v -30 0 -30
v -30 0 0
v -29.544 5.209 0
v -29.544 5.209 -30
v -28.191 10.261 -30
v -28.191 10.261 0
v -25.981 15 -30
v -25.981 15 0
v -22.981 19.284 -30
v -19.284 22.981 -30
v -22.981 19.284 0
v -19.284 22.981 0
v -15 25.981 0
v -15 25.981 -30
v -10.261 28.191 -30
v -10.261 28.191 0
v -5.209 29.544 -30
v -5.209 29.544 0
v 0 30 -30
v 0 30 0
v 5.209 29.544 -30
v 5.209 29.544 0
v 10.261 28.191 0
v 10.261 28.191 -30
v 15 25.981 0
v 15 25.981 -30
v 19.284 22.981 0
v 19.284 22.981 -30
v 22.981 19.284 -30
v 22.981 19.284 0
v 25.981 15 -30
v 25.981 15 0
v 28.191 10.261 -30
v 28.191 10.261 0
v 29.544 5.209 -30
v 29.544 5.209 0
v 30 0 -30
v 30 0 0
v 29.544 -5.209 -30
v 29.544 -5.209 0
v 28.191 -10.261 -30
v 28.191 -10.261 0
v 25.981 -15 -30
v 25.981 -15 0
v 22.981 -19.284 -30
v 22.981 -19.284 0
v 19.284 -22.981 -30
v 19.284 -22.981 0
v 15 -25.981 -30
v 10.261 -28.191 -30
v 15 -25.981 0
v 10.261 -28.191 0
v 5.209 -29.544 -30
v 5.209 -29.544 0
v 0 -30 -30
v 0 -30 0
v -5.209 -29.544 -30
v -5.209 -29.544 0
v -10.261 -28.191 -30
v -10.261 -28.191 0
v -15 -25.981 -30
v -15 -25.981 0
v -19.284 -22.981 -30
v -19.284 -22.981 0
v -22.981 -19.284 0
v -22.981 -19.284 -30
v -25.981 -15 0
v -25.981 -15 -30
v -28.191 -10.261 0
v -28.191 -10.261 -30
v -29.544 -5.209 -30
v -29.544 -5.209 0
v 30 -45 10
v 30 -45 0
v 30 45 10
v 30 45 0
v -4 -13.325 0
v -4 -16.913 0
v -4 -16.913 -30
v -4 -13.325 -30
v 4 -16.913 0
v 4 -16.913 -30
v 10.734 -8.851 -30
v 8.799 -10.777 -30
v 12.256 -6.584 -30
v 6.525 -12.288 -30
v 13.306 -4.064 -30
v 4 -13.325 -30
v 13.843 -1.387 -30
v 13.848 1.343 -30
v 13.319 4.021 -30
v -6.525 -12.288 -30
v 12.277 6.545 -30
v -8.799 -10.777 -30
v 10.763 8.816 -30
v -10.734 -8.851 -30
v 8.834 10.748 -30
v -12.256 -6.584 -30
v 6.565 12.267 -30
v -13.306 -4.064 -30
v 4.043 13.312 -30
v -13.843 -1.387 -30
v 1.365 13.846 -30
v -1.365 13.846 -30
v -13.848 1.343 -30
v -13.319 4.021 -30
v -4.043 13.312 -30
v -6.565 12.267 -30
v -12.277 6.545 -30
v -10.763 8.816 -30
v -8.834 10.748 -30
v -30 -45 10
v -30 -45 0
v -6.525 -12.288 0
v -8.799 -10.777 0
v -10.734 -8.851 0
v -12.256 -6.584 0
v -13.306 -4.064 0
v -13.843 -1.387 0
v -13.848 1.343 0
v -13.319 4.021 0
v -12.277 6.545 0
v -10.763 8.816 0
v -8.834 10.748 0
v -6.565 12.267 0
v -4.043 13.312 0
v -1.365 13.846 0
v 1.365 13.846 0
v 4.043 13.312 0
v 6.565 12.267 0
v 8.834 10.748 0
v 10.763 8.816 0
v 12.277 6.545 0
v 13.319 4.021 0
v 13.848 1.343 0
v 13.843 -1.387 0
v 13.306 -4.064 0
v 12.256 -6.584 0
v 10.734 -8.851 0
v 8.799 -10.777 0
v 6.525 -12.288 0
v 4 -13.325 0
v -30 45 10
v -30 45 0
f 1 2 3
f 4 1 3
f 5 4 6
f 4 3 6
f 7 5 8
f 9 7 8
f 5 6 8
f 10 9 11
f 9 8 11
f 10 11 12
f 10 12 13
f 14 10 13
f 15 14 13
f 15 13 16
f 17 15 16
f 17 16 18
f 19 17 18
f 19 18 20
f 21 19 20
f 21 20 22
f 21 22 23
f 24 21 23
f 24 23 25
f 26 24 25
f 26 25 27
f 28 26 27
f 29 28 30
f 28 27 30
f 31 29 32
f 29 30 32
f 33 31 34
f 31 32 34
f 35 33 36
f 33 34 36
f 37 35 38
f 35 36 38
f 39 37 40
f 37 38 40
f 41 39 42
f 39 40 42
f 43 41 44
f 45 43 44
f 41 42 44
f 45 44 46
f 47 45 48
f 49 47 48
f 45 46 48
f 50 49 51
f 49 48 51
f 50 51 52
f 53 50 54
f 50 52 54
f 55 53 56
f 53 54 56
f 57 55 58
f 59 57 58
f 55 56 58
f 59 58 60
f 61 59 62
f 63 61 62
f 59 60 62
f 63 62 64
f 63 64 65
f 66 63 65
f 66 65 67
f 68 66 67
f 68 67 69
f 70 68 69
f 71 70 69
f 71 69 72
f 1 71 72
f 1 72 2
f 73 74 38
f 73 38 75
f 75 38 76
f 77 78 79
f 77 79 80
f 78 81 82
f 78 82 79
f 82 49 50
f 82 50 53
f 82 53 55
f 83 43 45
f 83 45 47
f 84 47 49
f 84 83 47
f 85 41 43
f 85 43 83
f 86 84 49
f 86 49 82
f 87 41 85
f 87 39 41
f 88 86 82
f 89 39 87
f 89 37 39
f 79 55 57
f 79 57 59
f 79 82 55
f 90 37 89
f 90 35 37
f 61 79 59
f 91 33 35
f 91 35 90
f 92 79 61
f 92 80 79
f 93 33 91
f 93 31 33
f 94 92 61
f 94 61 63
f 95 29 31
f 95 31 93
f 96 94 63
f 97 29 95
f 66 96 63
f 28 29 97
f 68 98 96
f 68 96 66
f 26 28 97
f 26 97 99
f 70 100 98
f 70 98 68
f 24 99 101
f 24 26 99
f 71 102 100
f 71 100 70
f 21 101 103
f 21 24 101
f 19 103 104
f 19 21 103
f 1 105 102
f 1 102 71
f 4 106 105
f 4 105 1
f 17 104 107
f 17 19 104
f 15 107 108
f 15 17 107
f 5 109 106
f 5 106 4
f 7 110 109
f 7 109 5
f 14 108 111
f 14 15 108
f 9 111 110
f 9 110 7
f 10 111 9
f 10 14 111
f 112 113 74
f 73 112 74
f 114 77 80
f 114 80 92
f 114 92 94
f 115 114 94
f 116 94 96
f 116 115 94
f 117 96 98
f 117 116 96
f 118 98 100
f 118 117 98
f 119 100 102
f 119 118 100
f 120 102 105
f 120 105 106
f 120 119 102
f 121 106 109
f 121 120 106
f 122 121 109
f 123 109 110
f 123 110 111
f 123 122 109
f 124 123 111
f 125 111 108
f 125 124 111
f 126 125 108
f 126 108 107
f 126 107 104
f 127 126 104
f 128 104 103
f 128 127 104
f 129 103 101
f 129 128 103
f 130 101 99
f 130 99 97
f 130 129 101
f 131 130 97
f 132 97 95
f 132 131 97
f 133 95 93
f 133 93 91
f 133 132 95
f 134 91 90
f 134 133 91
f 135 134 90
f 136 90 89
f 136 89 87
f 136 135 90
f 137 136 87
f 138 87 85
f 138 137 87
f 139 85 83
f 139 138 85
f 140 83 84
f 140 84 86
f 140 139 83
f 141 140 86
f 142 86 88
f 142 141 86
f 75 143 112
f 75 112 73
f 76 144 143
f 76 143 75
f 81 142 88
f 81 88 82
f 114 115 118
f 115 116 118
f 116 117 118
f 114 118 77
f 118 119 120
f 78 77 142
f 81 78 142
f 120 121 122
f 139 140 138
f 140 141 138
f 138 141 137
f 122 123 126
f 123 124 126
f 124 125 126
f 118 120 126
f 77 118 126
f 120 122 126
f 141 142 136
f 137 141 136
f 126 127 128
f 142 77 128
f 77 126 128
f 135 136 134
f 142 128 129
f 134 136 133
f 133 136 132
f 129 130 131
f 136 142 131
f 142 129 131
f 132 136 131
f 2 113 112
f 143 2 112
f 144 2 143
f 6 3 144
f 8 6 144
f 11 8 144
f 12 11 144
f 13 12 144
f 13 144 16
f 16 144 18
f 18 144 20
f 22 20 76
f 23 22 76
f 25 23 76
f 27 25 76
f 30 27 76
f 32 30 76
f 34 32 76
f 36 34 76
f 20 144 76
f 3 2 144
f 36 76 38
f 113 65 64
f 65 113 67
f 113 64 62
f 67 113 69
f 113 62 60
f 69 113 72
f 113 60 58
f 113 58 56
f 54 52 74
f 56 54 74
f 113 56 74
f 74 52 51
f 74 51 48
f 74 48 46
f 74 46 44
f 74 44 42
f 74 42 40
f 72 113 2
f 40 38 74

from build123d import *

# Parameters (mm, degrees)
SKETCH1_W           = 60
SKETCH1_H           = 90
BOSS_EXTRUDE1_DEPTH = 10
SKETCH2_R           = 30
BOSS_EXTRUDE2_DEPTH = 30


with BuildPart() as part:
    # Sketch1 → Boss-Extrude1 (new body)
    with BuildSketch(Plane.XY):
        Rectangle(SKETCH1_W, SKETCH1_H)
    extrude(amount=BOSS_EXTRUDE1_DEPTH)

    # Sketch2 → Boss-Extrude2 (add)
    with BuildSketch(Plane(origin=(0, 0, 0), x_dir=(-1, 0, 0), z_dir=(0, 0, -1))):
        Circle(SKETCH2_R)
        with BuildLine():
            Line((4, -13.912685387), (4, -13.325269778))
            ThreePointArc((4, -13.325269778), (0, 13.912685387), (-4, -13.325269778))
            Line((-4, -13.325269778), (-4, -13.912685387))
            Line((-4, -13.912685387), (-4, -16.912685387))
            Line((-4, -16.912685387), (4, -16.912685387))
            Line((4, -16.912685387), (4, -13.912685387))
        make_face(mode=Mode.SUBTRACT)
    extrude(amount=BOSS_EXTRUDE2_DEPTH)


solid = part.part
